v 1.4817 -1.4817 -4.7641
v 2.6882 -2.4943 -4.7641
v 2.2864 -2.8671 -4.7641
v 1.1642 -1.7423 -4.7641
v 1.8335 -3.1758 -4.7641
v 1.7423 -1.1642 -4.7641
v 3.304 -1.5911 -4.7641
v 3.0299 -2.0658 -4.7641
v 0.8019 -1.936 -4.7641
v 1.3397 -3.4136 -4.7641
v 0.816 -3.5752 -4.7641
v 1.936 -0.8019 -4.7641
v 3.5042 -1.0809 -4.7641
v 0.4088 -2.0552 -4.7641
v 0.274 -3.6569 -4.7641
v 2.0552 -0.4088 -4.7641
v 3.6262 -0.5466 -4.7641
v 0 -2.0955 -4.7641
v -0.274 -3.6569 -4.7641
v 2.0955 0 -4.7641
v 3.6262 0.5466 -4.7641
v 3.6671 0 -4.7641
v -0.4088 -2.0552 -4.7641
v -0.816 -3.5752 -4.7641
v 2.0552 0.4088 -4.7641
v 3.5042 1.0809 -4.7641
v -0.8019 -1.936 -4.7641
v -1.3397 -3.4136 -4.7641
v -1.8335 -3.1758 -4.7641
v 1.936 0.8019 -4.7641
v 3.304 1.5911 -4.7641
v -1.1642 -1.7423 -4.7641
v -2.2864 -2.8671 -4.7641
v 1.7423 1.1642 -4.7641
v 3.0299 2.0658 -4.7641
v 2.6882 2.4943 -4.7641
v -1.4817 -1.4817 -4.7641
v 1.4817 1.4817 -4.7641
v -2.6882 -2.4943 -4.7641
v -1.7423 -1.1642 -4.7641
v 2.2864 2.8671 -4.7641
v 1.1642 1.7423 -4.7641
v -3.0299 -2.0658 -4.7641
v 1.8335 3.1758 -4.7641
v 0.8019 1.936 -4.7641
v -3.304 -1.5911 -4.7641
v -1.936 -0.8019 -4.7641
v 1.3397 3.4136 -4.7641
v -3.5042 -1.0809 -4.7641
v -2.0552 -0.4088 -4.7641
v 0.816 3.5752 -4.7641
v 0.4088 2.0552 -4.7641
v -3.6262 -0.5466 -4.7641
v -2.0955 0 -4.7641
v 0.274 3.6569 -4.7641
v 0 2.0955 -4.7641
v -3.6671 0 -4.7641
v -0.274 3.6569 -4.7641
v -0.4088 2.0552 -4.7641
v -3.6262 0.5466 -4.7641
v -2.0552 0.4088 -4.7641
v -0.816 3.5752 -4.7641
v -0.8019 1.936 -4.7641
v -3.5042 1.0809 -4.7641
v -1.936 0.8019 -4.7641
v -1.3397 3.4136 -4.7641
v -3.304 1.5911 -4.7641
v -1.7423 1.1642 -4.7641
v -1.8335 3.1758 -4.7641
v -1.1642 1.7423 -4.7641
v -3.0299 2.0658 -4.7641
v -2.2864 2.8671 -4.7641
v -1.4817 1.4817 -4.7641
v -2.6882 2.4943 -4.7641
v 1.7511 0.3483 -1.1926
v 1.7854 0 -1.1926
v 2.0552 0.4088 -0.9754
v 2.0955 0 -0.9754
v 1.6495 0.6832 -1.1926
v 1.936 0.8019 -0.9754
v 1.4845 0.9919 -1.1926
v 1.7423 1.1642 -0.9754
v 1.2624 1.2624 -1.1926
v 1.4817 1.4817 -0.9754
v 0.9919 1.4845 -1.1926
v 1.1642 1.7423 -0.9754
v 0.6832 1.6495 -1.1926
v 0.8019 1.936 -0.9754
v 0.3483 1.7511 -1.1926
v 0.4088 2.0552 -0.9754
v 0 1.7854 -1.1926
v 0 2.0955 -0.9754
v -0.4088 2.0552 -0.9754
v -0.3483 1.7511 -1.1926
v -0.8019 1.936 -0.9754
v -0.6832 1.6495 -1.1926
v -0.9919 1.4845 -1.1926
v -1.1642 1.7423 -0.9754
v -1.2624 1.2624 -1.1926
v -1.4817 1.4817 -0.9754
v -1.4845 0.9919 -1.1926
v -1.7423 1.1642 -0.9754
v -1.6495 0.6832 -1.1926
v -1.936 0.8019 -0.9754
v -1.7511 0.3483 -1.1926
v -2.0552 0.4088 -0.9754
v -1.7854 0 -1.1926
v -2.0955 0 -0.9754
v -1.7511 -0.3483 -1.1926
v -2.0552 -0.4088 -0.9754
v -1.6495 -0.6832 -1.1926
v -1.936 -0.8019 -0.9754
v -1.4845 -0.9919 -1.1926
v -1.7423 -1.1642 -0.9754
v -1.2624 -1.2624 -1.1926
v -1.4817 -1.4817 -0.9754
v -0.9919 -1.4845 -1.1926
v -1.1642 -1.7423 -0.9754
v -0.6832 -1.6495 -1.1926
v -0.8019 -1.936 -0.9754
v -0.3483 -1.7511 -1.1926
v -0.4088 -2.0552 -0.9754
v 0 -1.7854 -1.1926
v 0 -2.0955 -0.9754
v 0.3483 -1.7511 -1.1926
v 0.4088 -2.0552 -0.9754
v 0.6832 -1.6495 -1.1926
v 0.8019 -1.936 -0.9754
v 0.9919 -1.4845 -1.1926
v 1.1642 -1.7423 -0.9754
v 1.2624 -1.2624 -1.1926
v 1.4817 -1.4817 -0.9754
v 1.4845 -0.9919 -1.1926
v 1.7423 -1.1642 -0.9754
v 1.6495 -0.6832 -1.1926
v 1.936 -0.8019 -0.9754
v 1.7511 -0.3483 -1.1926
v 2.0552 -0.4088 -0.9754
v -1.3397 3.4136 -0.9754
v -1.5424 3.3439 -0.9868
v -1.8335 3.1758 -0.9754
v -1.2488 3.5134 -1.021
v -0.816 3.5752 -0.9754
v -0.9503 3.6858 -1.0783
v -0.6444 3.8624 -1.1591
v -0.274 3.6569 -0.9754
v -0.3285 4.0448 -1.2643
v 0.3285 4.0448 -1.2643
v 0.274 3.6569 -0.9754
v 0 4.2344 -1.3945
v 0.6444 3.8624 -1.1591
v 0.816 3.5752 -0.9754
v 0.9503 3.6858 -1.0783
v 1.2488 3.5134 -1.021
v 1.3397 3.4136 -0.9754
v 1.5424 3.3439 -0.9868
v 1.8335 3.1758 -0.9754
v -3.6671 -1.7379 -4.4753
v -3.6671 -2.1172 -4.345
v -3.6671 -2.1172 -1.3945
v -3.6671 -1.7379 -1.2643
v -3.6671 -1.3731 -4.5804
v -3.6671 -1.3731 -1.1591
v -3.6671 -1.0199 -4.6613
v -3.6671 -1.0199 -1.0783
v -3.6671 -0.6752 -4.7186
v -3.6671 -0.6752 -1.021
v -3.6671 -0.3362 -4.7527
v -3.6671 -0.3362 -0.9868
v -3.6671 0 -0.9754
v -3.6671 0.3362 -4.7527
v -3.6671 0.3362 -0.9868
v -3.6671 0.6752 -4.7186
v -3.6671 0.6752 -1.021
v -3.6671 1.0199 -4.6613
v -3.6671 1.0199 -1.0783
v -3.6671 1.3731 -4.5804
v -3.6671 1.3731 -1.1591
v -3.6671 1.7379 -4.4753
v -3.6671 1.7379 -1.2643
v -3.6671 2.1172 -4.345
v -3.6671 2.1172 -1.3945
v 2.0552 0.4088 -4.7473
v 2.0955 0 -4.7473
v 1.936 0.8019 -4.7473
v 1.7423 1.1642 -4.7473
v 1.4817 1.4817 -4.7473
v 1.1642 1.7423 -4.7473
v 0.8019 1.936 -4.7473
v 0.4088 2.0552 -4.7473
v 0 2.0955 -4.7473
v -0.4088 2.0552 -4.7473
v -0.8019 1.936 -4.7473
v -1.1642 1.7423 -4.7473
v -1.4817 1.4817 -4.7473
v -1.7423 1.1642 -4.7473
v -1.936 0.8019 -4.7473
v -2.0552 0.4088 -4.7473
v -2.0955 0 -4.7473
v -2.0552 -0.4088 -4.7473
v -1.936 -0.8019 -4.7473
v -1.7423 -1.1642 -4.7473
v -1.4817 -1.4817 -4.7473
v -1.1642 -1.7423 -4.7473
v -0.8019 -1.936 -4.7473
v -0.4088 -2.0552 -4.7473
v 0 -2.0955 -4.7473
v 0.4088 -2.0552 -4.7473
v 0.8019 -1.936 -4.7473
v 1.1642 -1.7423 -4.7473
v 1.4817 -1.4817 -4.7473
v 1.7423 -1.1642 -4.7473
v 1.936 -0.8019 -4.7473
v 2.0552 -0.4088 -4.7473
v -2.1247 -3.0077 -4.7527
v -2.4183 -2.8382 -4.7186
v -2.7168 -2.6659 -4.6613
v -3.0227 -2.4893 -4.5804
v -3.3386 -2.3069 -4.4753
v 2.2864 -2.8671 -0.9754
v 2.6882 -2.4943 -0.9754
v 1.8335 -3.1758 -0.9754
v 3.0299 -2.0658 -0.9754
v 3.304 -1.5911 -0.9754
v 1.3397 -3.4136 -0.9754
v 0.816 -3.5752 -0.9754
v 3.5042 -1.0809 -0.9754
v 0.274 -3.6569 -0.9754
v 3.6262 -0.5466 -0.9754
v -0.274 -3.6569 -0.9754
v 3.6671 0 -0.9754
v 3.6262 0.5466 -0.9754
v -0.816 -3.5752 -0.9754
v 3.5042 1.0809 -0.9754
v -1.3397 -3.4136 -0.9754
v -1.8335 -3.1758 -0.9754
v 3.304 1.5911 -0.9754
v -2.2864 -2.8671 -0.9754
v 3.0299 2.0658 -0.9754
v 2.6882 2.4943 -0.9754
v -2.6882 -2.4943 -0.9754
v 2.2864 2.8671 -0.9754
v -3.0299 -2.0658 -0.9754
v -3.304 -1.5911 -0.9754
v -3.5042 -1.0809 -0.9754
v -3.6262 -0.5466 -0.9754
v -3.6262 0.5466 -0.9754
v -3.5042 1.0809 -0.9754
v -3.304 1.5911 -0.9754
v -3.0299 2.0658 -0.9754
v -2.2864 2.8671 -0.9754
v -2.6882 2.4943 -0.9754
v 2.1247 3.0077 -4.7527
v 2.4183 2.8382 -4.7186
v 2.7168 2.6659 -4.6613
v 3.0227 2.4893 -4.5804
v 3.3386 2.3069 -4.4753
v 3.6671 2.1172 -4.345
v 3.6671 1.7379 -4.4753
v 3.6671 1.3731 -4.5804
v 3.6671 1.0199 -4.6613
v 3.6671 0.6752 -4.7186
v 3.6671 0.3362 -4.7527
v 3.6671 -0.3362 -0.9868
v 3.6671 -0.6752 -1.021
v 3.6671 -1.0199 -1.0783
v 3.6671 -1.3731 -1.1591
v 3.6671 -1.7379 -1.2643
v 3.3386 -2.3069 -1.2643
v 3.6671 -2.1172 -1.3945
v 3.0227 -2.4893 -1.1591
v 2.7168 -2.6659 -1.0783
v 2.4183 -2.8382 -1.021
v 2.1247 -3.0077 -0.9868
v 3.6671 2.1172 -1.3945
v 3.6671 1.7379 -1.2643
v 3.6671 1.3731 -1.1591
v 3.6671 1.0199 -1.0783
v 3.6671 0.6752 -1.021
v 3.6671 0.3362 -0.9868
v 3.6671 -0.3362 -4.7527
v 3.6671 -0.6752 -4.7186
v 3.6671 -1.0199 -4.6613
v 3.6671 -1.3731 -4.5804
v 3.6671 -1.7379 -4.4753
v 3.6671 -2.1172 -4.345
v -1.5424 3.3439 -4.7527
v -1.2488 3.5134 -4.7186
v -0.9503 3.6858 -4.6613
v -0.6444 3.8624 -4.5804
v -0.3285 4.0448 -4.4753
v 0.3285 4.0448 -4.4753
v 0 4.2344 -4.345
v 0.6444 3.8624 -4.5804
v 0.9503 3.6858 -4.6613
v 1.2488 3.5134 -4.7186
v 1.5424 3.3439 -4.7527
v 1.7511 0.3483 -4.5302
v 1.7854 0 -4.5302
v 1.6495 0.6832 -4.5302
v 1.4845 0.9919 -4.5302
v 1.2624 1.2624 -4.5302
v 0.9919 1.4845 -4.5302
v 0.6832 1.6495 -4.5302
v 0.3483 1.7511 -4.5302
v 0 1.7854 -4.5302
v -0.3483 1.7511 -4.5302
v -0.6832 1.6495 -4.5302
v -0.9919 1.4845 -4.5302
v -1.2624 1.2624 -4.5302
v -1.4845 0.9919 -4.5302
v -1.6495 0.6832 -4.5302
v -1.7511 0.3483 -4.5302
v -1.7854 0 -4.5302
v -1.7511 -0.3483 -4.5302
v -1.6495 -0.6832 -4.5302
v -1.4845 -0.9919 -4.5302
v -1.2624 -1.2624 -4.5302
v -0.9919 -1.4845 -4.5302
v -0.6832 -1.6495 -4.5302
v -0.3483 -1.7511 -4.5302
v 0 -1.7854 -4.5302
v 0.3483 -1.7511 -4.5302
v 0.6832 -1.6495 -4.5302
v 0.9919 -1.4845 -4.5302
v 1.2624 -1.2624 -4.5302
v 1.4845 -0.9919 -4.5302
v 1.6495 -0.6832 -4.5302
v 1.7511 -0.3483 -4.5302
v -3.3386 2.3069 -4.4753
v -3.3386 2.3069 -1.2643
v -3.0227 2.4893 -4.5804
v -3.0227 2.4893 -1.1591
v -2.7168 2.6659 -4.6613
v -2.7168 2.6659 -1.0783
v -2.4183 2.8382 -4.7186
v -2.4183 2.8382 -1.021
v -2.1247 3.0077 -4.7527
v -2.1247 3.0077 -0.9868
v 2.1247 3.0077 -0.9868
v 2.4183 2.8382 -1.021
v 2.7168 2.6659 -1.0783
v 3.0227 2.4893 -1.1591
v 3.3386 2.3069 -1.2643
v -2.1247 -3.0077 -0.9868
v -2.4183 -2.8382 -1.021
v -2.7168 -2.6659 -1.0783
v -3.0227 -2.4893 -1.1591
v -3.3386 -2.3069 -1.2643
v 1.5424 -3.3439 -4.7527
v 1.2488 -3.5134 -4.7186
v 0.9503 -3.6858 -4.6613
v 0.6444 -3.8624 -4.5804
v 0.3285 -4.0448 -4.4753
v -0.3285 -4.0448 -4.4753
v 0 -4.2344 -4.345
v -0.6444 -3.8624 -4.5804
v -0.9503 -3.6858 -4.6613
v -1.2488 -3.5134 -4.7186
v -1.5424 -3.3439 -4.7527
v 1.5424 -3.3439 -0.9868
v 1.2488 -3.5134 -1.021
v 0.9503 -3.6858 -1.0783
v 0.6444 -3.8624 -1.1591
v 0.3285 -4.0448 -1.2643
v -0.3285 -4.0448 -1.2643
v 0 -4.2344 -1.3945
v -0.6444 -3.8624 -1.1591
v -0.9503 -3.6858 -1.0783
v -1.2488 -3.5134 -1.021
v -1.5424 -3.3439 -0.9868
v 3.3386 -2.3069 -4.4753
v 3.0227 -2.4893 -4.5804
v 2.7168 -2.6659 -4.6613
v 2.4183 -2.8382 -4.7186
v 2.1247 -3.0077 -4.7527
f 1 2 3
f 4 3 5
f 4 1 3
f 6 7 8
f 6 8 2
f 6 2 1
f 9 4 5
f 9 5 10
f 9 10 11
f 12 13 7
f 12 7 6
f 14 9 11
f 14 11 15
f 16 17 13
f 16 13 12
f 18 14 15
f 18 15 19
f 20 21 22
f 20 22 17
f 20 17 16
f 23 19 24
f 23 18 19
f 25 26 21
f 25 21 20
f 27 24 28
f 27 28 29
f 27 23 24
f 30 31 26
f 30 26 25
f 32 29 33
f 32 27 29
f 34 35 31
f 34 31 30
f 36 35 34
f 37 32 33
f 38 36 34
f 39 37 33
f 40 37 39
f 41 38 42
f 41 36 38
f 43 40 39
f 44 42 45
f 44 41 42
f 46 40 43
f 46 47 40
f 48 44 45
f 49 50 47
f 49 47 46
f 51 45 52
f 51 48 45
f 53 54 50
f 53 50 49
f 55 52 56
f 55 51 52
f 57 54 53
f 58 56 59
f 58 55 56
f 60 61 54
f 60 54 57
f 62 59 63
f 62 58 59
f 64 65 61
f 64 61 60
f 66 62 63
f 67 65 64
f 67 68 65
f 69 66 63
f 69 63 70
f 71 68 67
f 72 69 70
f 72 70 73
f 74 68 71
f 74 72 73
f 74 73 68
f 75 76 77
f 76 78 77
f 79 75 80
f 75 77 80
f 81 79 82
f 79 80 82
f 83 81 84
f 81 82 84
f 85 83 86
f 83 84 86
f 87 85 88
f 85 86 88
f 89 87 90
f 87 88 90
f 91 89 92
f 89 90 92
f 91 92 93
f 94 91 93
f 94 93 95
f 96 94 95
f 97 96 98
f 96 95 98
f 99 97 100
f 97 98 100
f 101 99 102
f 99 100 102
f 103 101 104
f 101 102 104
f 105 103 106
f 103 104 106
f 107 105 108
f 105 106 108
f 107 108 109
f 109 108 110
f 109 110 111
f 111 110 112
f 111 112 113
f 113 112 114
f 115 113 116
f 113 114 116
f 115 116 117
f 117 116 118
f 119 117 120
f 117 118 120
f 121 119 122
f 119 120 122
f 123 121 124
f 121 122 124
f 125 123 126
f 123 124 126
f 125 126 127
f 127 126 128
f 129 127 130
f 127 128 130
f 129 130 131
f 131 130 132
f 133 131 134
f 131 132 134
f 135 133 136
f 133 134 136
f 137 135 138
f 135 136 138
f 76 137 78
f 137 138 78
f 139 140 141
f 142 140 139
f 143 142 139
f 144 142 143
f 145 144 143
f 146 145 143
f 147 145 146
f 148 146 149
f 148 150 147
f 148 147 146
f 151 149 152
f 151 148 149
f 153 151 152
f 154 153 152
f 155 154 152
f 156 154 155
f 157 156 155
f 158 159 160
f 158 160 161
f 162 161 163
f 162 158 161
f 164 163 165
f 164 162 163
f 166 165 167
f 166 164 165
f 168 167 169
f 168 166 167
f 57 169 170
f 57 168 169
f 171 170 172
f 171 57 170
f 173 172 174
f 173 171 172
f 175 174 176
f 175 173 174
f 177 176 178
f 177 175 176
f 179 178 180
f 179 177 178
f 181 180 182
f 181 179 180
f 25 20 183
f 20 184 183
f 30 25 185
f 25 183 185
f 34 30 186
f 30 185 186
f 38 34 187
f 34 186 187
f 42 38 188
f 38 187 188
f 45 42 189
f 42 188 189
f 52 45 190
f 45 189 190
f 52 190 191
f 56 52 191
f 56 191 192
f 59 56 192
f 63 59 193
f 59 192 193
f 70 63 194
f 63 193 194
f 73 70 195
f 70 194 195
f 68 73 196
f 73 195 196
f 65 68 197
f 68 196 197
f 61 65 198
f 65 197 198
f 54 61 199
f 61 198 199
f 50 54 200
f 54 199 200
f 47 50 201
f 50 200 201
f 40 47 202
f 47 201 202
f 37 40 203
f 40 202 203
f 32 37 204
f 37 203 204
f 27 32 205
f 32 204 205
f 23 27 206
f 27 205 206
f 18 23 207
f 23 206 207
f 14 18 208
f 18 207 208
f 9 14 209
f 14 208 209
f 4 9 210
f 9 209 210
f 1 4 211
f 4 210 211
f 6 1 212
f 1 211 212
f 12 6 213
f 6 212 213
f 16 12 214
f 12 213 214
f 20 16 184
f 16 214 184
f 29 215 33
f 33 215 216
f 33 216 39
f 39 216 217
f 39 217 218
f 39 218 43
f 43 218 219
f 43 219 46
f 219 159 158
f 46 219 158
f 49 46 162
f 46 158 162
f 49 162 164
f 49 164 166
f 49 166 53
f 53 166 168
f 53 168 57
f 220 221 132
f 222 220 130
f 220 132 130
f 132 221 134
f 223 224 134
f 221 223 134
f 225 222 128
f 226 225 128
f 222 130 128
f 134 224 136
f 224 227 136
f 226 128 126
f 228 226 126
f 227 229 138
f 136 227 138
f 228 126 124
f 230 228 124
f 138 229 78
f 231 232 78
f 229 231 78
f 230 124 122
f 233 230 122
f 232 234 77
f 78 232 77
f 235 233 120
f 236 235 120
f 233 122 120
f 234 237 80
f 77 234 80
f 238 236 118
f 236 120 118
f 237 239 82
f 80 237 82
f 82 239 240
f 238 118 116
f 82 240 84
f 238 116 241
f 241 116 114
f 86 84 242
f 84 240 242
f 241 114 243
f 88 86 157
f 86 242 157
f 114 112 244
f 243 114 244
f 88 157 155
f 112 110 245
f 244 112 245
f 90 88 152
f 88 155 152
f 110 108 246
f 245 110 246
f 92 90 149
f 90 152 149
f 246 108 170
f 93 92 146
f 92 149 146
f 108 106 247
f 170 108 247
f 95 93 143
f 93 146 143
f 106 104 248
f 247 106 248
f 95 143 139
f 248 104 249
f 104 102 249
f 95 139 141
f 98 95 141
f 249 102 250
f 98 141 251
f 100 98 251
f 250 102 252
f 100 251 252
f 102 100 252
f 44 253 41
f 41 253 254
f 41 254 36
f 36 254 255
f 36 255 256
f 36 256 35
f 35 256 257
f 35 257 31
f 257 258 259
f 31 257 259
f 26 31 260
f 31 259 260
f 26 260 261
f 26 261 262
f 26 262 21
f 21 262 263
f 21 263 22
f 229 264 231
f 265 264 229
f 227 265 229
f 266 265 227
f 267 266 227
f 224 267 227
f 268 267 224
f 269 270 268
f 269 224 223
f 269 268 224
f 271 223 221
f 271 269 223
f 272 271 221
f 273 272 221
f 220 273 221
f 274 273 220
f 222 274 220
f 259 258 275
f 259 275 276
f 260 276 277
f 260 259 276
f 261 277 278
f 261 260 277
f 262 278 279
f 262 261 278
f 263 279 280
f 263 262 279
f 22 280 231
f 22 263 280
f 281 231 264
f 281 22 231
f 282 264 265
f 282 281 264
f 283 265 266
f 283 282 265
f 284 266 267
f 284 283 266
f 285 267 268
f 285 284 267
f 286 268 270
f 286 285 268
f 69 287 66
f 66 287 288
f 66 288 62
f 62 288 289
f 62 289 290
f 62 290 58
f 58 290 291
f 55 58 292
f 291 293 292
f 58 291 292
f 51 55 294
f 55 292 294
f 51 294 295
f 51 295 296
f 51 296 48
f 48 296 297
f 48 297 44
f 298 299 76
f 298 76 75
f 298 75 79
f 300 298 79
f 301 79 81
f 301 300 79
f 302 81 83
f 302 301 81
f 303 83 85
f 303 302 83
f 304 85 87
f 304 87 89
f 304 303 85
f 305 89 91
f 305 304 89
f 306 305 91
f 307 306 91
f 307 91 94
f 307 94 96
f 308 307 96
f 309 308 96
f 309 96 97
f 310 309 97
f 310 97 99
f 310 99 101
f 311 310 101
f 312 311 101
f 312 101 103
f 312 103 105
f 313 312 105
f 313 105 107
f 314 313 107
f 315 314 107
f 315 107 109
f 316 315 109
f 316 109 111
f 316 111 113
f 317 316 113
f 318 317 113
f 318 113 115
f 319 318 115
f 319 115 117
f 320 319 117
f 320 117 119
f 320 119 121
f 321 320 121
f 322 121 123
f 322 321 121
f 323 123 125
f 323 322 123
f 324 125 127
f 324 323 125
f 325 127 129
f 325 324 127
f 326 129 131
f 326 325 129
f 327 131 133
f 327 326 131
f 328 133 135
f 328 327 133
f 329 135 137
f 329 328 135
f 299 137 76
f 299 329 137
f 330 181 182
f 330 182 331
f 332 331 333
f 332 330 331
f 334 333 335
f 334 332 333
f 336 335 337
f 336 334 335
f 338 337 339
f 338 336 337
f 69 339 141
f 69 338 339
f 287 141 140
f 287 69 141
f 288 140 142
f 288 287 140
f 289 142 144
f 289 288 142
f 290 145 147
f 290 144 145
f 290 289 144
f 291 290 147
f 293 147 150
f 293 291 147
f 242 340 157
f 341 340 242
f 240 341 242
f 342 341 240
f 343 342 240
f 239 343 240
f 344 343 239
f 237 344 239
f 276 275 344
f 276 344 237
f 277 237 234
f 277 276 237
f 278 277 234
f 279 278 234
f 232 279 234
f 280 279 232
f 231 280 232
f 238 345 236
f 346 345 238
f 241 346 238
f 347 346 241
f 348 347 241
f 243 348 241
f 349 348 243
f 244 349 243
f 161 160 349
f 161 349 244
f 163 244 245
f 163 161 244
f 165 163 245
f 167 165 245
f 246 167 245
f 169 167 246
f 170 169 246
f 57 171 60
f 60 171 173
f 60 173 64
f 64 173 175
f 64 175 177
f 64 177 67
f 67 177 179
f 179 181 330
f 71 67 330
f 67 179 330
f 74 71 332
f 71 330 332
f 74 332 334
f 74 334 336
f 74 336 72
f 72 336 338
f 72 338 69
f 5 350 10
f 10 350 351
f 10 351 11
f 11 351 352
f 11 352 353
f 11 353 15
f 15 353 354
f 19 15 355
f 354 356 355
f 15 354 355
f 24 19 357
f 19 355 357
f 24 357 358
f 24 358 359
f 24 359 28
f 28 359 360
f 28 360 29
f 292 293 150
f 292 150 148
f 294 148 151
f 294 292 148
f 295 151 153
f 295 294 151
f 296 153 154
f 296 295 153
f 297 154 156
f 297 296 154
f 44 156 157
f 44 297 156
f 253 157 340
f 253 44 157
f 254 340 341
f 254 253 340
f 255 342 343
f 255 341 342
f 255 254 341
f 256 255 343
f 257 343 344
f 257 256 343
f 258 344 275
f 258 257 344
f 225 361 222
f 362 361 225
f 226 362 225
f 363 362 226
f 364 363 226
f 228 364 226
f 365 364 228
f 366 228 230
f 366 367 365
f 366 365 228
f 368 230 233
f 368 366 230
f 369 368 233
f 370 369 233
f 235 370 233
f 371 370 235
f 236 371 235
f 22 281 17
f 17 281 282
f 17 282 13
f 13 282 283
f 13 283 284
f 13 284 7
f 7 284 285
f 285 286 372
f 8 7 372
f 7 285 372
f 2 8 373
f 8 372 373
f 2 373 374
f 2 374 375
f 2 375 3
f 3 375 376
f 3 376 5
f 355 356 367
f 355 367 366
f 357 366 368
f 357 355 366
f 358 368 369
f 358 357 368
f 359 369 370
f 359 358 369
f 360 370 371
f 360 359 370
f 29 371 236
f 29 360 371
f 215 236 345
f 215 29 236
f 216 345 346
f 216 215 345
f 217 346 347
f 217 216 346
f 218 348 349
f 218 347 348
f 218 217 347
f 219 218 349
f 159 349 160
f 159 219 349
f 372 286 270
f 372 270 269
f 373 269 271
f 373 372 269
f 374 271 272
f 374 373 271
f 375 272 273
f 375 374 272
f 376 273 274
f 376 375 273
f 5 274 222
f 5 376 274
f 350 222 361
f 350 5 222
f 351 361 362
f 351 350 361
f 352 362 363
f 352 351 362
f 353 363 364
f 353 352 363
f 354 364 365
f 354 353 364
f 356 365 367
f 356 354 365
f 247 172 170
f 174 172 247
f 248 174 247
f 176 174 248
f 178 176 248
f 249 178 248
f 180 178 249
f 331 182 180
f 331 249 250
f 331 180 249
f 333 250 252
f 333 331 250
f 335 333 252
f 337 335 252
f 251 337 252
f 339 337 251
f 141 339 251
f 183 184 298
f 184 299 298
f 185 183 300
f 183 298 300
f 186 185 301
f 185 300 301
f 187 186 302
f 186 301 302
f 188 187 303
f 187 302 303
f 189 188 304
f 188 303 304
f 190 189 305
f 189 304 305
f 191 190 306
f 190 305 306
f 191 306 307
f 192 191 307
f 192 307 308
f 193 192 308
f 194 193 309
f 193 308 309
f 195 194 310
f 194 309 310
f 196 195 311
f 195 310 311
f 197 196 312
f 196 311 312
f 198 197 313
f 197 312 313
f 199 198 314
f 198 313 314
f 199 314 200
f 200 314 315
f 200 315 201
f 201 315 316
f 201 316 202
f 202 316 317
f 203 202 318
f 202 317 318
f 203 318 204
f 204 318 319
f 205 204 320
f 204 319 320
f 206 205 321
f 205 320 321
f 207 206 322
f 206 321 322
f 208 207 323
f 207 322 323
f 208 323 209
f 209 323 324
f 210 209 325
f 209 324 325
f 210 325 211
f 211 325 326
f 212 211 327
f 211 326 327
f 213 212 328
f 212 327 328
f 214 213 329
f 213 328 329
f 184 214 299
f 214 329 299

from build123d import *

# Parameters (mm, degrees)
BASENUT_START = -5.7404
BASENUTSKE_R  = 2.7051
BASENUT_DEPTH = 5.7404
SCALE1_SCALE  = 0.66


# Read off the part's stored shape, not the designer's step: ThreadSchematic
with BuildPart() as part:
    # BaseNutSke → BaseNut (new body)
    with BuildSketch(Plane.XY.offset(BASENUT_START)):
        Polygon((5.55625, 3.207902433), (5.55625, -3.207902433), (0, -6.415804866), (-5.55625, -3.207902433), (-5.55625, 3.207902433), (0, 6.415804866), align=None)
        Circle(BASENUTSKE_R, mode=Mode.SUBTRACT)
    extrude(amount=BASENUT_DEPTH)

    # Sketch5 (on Front Plane) → EndChamfer (revolve, cut)
    with BuildSketch(Plane.XY):
        Polygon((5.715, 3.175), (5.353069726, 2.65811), (5.7658, 2.65811), (5.7658, 3.175), align=None)
    revolve(axis=Axis((5.715, 3.175, 0), (-0.5735764363510442, -0.8191520442889932, 0)), mode=Mode.SUBTRACT)

    # Sketch3 → Double-Chamfer (revolve, cut)
    with BuildSketch(Plane(origin=(0, 0, 0), x_dir=(0, 0, -1), z_dir=(1, 0, 0))):
        Polygon((5.7404, 5.55625), (5.1054, 6.415804866), (5.1054, 19.115804866), (18.4404, 19.115804866), (18.4404, 5.55625), align=None)
        Polygon((0.635, 19.115804866), (-12.7, 19.115804866), (-12.7, 5.55625), (0, 5.55625), (0.635, 6.415804866), align=None)
    revolve(axis=Axis((0, 0, 0), (0, 0, -1)), mode=Mode.SUBTRACT)

    # ThreadSchematic outline → ThreadSchematic (revolve, cut)
    with BuildSketch(Plane.XZ):
        Polygon((2.7051, 0), (2.7051, -0.329027522), (3.175, 0), align=None)
        Polygon((3.175, -5.715), (2.7051, -5.385972478), (2.7051, -5.7404), (3.175, -5.7404), align=None)
    revolve(axis=Axis((0, 0, 0), (0, 0, 1)), mode=Mode.SUBTRACT)


with BuildPart() as part_1:
    # Scale1: scaled about (0, 0, -2.868948271)
    add(part.part.scale(SCALE1_SCALE).moved(Location((0, 0, -0.975442412))))


solid = part_1.part
